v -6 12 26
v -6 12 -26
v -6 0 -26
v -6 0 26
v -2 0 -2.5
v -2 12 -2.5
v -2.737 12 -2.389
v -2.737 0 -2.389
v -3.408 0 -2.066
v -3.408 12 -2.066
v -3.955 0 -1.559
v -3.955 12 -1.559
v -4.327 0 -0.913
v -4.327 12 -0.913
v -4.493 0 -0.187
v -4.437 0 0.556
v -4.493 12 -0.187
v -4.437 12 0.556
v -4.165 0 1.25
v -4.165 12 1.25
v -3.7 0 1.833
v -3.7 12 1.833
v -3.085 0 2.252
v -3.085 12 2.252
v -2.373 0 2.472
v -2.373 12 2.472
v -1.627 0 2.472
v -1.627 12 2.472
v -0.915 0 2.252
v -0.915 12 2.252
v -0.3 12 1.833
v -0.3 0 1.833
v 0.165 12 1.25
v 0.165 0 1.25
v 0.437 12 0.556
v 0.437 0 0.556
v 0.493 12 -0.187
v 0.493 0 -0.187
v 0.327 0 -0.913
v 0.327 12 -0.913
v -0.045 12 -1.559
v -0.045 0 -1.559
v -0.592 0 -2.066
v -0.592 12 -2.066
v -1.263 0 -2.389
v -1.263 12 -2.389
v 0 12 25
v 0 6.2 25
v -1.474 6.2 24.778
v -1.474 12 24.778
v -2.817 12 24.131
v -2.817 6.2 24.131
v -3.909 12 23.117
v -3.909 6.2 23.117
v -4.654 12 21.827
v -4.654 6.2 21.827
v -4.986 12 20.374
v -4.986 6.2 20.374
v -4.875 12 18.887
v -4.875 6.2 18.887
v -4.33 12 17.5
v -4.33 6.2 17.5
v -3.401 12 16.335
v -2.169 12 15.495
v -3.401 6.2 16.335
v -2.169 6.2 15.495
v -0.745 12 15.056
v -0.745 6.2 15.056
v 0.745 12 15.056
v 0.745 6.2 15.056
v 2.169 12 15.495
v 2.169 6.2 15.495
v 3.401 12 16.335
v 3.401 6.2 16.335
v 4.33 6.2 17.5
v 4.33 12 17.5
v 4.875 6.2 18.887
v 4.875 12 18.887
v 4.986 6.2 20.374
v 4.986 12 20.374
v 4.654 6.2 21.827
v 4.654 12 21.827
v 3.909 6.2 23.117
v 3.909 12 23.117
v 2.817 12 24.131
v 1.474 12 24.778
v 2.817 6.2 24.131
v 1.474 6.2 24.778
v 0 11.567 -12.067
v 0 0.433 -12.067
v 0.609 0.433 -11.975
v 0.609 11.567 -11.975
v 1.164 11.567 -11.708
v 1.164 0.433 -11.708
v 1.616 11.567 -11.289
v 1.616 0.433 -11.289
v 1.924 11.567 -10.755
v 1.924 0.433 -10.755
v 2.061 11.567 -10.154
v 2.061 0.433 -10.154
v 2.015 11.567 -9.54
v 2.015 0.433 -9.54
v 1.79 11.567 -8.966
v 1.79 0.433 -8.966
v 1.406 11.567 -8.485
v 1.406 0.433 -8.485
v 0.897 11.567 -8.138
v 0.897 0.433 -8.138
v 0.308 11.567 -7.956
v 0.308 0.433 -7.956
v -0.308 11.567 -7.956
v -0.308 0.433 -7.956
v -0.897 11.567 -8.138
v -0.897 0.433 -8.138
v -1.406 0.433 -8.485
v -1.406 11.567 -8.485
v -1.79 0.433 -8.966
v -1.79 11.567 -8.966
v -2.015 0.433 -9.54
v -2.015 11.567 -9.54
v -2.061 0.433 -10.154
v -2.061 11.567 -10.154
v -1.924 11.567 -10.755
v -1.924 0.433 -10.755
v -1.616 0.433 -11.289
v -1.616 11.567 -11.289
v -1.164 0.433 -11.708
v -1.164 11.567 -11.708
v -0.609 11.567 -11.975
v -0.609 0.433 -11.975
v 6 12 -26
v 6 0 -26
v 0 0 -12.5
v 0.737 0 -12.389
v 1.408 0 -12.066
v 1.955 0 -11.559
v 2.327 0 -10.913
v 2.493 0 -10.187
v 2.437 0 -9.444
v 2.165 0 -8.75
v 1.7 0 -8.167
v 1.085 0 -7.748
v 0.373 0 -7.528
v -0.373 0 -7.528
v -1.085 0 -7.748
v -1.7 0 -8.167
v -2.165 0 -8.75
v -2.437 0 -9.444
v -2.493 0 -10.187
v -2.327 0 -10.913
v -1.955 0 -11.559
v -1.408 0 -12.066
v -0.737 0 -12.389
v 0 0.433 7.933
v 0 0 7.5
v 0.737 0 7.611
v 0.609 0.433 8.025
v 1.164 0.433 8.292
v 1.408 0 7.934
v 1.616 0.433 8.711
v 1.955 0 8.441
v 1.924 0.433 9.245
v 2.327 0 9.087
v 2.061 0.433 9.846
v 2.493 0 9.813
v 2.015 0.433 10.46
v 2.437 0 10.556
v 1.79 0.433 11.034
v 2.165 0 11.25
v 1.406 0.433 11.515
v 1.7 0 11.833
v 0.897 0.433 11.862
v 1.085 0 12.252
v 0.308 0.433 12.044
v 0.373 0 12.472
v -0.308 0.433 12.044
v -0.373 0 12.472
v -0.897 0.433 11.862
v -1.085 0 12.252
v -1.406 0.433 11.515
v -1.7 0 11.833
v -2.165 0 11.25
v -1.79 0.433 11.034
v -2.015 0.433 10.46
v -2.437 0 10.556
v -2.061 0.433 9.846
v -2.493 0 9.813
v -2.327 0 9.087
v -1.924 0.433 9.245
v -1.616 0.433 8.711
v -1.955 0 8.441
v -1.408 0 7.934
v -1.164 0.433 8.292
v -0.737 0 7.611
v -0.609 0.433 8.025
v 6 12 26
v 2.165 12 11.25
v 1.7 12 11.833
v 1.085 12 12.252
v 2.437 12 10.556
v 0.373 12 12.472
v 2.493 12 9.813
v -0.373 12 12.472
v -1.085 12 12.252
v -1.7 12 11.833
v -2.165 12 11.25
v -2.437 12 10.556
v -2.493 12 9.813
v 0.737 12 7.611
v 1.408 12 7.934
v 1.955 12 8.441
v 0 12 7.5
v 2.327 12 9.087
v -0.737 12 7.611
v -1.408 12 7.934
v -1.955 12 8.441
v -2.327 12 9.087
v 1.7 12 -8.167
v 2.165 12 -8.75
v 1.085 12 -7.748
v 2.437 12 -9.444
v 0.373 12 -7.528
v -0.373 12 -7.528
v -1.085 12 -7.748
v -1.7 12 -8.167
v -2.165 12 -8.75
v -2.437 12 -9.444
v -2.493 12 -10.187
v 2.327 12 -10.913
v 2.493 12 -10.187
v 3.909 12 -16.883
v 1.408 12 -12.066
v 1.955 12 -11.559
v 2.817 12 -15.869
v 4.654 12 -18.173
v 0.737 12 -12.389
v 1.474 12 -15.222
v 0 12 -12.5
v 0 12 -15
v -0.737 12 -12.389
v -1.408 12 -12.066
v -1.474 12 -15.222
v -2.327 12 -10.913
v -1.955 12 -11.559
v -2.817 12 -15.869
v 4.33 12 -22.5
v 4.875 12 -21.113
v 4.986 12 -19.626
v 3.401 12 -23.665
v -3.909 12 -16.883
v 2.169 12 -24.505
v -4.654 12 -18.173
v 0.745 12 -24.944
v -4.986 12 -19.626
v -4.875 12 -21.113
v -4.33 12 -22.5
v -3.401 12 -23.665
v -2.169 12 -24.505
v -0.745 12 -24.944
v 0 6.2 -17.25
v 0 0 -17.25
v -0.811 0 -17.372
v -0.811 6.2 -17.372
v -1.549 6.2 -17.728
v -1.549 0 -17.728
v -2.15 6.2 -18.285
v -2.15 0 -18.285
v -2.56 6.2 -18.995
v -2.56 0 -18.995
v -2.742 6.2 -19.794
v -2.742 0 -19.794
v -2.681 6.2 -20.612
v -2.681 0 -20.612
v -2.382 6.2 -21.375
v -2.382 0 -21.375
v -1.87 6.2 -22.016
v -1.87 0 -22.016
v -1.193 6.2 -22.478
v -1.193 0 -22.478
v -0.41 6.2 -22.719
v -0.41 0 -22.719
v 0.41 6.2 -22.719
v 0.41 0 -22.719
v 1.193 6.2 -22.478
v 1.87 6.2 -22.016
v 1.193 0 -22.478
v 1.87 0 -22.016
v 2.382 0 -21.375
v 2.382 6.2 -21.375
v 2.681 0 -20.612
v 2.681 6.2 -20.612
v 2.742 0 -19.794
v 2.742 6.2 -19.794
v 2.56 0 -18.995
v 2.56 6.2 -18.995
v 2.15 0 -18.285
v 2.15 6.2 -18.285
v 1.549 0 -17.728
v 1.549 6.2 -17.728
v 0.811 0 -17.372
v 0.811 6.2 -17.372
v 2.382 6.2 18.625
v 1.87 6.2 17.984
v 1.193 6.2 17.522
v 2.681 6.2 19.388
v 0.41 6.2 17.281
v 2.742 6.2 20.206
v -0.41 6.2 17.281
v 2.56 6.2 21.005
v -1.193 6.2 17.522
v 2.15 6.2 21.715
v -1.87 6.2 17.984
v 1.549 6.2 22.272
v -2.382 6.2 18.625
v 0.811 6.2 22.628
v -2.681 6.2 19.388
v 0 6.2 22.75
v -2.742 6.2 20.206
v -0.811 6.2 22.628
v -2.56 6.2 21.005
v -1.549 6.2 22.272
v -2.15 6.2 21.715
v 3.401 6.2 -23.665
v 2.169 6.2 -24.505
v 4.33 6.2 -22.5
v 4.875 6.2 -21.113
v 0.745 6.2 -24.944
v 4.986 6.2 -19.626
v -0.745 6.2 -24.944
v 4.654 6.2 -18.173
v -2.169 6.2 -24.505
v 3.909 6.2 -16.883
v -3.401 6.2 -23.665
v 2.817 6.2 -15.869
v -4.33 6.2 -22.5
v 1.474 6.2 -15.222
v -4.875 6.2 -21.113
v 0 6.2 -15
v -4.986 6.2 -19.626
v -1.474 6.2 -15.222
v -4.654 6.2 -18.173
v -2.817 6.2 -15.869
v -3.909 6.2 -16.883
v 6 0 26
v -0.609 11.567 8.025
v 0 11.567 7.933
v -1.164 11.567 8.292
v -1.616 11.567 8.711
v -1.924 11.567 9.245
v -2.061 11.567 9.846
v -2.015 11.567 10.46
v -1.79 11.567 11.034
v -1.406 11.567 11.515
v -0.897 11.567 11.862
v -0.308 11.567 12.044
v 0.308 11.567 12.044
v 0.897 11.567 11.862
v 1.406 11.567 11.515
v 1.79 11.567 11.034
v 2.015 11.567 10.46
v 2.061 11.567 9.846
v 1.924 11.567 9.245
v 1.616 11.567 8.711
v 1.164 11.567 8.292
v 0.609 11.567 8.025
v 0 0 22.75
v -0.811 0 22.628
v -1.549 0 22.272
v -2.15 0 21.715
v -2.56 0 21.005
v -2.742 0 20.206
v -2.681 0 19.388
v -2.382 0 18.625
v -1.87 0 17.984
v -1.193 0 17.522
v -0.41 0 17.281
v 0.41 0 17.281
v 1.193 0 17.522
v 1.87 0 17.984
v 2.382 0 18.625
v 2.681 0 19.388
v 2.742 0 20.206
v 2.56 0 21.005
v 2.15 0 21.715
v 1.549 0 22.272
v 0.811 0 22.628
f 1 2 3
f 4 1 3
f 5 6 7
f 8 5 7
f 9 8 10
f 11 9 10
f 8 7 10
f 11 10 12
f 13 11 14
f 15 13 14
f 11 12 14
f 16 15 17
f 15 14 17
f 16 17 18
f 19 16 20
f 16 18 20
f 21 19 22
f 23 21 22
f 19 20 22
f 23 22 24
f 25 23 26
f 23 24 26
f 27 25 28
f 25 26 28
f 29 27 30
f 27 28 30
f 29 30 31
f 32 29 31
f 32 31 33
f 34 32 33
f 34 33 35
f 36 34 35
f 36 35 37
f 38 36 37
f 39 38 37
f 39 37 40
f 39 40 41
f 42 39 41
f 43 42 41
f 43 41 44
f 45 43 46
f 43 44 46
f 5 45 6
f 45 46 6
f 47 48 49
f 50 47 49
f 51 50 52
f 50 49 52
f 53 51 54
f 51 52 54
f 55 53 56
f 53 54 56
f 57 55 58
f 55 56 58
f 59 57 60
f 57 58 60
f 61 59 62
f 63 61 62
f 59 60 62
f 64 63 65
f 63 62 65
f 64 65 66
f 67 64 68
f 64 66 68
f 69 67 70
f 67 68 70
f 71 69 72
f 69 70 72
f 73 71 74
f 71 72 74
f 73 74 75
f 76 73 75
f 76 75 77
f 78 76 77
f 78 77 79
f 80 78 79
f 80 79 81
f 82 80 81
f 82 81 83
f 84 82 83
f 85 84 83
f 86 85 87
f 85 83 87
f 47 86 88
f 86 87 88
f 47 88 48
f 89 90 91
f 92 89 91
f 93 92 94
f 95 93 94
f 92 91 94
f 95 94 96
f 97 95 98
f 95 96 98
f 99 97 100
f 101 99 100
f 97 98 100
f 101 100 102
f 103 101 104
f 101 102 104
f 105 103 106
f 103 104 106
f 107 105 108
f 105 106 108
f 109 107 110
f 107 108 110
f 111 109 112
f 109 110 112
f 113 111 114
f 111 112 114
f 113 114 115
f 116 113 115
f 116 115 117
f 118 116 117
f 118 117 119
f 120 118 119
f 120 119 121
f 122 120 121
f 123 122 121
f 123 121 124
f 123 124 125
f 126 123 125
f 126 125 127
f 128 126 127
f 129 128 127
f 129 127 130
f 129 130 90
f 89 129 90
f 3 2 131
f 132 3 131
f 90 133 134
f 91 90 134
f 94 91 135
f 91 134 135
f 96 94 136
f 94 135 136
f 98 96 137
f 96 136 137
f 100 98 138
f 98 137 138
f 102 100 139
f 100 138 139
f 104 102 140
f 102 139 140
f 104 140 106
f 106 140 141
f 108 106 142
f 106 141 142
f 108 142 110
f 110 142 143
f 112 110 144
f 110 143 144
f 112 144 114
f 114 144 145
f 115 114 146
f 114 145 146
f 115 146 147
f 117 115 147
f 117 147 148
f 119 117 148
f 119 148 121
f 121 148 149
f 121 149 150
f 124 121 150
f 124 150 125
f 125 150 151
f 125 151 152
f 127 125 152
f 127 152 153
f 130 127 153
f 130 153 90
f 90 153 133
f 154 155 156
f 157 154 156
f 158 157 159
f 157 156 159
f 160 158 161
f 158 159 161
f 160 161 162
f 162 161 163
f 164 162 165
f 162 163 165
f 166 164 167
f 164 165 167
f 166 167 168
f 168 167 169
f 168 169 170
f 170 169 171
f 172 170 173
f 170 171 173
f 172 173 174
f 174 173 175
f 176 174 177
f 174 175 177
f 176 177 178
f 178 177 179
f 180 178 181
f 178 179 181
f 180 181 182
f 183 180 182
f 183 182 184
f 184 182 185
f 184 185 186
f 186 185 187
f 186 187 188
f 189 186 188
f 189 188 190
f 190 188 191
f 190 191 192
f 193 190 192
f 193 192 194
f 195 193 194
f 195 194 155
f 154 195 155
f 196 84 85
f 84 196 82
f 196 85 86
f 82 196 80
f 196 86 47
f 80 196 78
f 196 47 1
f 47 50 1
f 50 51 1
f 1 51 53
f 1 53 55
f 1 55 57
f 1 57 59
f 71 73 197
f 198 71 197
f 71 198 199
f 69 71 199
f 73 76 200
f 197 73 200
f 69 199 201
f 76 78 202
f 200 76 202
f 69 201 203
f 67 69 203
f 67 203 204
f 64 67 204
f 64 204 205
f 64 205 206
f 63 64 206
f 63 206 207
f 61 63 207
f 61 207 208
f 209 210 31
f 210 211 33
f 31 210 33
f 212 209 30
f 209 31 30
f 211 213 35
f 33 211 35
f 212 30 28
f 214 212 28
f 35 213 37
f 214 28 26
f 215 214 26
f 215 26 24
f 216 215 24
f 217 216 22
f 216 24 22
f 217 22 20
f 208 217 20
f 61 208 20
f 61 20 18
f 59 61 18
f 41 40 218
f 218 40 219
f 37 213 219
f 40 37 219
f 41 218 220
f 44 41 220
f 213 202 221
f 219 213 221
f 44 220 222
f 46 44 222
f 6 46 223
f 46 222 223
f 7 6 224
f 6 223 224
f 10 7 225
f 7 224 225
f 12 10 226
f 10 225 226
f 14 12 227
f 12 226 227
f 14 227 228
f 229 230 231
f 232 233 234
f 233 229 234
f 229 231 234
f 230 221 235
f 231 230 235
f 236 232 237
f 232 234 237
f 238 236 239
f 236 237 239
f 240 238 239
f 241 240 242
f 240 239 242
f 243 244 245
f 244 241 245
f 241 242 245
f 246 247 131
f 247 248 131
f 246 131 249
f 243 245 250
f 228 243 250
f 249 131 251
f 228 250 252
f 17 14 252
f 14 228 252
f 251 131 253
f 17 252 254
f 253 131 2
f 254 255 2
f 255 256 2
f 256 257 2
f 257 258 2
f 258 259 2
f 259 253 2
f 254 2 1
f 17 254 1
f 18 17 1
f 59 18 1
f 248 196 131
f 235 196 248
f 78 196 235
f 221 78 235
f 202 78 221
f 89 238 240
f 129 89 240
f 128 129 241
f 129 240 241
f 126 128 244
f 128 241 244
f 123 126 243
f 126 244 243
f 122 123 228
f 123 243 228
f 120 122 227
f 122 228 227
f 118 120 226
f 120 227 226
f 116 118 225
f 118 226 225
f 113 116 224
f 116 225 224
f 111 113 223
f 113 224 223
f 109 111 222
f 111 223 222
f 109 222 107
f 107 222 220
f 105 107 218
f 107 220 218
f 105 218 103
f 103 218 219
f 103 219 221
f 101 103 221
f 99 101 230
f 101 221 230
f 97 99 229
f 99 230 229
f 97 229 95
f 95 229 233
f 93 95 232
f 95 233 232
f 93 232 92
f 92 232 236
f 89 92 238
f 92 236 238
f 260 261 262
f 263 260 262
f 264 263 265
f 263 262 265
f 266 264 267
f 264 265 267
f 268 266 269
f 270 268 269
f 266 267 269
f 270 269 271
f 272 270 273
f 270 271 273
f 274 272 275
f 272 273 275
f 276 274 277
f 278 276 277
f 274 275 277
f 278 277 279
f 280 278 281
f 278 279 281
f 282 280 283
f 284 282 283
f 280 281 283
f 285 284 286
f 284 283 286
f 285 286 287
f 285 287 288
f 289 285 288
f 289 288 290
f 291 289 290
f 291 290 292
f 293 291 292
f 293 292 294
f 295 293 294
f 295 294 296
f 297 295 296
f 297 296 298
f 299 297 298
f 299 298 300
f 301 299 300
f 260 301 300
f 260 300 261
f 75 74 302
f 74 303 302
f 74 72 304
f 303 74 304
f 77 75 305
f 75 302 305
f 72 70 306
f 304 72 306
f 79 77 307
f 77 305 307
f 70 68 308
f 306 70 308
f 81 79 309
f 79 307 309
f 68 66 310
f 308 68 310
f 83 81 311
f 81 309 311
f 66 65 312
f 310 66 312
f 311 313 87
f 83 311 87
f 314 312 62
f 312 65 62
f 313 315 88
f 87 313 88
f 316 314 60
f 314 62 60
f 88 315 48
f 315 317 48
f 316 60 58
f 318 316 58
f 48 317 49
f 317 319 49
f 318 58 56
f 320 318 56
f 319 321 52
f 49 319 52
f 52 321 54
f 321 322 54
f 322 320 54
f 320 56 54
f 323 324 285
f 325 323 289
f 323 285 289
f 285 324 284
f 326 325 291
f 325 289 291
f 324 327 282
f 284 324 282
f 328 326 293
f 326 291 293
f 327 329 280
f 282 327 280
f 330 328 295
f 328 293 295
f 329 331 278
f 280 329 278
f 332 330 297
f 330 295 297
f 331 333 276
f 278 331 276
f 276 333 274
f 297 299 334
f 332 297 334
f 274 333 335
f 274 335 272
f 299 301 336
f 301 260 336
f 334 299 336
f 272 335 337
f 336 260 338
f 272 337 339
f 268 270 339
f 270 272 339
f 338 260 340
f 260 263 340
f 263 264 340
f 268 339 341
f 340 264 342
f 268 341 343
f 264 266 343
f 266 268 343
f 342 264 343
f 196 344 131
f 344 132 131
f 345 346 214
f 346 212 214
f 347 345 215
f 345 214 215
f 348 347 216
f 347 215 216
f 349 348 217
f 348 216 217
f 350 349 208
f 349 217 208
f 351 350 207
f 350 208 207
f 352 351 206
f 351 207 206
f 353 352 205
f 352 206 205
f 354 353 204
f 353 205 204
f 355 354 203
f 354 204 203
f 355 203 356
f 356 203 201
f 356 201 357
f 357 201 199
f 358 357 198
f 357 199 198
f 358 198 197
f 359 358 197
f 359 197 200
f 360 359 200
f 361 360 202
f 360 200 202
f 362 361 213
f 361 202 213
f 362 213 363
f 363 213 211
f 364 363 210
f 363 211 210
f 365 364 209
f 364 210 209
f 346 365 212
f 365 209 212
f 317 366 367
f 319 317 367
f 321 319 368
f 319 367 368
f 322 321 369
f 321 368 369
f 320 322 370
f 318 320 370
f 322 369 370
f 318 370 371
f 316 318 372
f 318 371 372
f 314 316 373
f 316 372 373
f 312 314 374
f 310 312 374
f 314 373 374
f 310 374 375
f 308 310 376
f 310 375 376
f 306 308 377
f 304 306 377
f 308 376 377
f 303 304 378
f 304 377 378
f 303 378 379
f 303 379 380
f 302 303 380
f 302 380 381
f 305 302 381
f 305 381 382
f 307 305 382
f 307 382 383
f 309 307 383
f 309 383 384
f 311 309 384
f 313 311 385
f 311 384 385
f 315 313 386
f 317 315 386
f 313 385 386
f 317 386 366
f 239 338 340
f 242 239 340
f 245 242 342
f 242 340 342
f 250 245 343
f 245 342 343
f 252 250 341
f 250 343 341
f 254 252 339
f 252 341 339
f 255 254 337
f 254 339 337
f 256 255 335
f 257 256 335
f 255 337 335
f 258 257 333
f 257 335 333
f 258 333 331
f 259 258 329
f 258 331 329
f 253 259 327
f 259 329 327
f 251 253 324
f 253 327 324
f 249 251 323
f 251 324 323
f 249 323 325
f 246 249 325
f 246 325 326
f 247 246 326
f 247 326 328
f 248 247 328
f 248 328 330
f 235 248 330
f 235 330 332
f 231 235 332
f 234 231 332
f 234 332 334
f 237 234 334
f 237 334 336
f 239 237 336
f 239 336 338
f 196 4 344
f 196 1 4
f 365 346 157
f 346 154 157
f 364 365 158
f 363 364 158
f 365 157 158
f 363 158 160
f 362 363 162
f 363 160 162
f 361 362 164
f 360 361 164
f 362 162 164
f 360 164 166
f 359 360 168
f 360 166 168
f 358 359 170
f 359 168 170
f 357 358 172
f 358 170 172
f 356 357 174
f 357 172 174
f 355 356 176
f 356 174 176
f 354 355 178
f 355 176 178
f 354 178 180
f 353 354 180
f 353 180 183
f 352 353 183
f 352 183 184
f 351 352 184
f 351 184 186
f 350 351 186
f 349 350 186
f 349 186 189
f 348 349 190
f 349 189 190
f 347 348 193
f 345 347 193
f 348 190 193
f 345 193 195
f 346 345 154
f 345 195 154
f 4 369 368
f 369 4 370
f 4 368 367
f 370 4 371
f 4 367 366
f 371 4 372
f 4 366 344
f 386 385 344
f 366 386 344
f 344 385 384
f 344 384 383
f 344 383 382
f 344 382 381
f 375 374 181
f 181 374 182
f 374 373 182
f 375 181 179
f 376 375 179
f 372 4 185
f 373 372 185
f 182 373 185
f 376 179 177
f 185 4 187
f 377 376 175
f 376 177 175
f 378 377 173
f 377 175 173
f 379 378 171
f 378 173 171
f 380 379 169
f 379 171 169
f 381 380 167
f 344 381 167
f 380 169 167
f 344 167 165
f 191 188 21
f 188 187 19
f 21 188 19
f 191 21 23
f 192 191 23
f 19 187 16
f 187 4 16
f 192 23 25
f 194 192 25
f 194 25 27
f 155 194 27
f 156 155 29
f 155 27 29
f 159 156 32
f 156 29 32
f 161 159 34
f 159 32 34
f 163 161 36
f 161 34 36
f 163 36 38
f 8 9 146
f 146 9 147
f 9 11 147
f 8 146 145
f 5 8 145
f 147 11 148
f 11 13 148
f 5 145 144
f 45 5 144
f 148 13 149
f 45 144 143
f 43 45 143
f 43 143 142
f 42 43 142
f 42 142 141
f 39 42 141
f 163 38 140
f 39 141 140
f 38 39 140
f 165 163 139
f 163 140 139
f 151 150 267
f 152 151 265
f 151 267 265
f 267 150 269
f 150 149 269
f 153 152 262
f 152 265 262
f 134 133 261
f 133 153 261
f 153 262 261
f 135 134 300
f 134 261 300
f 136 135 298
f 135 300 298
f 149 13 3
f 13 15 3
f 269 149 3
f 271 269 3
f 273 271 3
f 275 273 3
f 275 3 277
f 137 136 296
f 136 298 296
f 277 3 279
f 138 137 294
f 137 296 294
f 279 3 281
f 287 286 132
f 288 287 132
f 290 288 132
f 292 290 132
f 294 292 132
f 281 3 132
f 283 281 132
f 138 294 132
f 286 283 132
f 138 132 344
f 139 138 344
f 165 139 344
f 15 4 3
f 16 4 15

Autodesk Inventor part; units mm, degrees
sketch "Sketch_4" plane through (0, 0, 0) normal (0, 0, 1) x (1, 0, 0)
  line L0 (-6, 12) -> (-6, 0)
  line L1 (-6, 0) -> (6, 0)
  line L2 (6, 0) -> (6, 12)
  line L3 (6, 12) -> (-6, 12)
extrude "Extrusion1" add sketch "Sketch_4" along normal mid plane 52
sketch "Sketch2" plane through (-6, 12, 26) normal (0, 1, 0) x (1, 0, 0)
  point P0 (6, 46)
hole "Hole1" at (0, 12, -20) direction (0, -1, 0) diameter 5.5 depth 12 counterbore diameter 10 counterbore depth 5.8
sketch "Sketch3" plane through (-6, 12, 26) normal (0, 1, 0) x (1, 0, 0)
  point P0 (6, 6)
hole "Hole2" at (0, 12, 20) direction (0, -1, 0) diameter 5.5 depth 12 counterbore diameter 10 counterbore depth 5.8
sketch "Sketch_13" plane through (0, 0, 0) normal (1, 0, 0) x (0, 0, -1)
  line L0 (10, 0) -> (10, 12)
  line L1 (10, 12) -> (12.5, 12)
  line L2 (12.5, 12) -> (12.067, 11.567)
  line L3 (12.067, 11.567) -> (12.067, 0.433)
  line L4 (12.067, 0.433) -> (12.5, 0)
  line L5 (12.5, 0) -> (10, 0)
  line L6 (10, 0) -> (10, 12)
revolve "Revolution1" cut sketch "Sketch_13" angle 360 about axis through (0, 0, -10) along (0, -1, 0)
thread "Thread1" size "M5x0.8" class "6H" standard "ISO Metric profile" full length
sketch "Sketch_14" plane through (0, 0, 0) normal (1, 0, 0) x (0, 0, -1)
  line L0 (-10, 0) -> (-10, 12)
  line L1 (-10, 12) -> (-7.5, 12)
  line L2 (-7.5, 12) -> (-7.933, 11.567)
  line L3 (-7.933, 11.567) -> (-7.933, 0.433)
  line L4 (-7.933, 0.433) -> (-7.5, 0)
  line L5 (-7.5, 0) -> (-10, 0)
  line L6 (-10, 0) -> (-10, 12)
revolve "Revolution2" cut sketch "Sketch_14" angle 360 about axis through (0, 0, 10) along (0, -1, 0)
thread "Thread2" size "M5x0.8" class "6H" standard "ISO Metric profile" full length
sketch "Sketch6" plane through (-6, 0, 26) normal (0, -1, 0) x (1, 0, 0)
  point P0 (4, -26)
hole "Hole3" at (-2, 0, 0) direction (0, 1, 0) diameter 5 depth 12
ref_plane "HGO_ANBAU_XY" through (0, 0, 0) normal (0, 1, 0) x (1, 0, 0)
ref_plane "HGO_ANBAU_YZ" through (0, 0, 0) normal (1, 0, 0) x (0, 0, -1)
ref_plane "HGO_ANBAU_ZX" through (0, 0, 0) normal (0, 0, -1) x (0, 1, 0)
ref_plane "HGO_ANBAU_Schrauben_1_XY" through (0, 5.5, -20) normal (0, -1, 0) x (1, 0, 0)
ref_plane "HGO_ANBAU_Schrauben_1_YZ" through (0, 5.5, -20) normal (1, 0, 0) x (0, 0, 1)
ref_plane "HGO_ANBAU_Schrauben_1_ZX" through (0, 5.5, -20) normal (0, 0, 1) x (0, -1, 0)
ref_plane "HGO_ANBAU_Schrauben_2_XY" through (0, 5.5, 20) normal (0, -1, 0) x (1, 0, 0)
ref_plane "HGO_ANBAU_Schrauben_2_YZ" through (0, 5.5, 20) normal (1, 0, 0) x (0, 0, 1)
ref_plane "HGO_ANBAU_Schrauben_2_ZX" through (0, 5.5, 20) normal (0, 0, 1) x (0, -1, 0)
ref_plane "KLEMMHALTER_XY" through (0, 12, 0) normal (0, 1, 0) x (1, 0, 0)
ref_plane "KLEMMHALTER_YZ" through (0, 12, 0) normal (1, 0, 0) x (0, 0, -1)
ref_plane "KLEMMHALTER_ZX" through (0, 12, 0) normal (0, 0, -1) x (0, 1, 0)
properties part number "722627 MUE-70/80P2"
